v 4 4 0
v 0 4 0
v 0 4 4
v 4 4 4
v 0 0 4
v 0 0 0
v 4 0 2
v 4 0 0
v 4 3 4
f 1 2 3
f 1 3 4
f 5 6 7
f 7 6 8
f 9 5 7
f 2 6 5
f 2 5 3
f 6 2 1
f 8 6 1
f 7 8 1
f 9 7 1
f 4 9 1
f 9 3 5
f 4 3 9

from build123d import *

# Parameters (mm, degrees)
F0_W     = 4
F0_H     = 4
F1_DEPTH = 4
F5_DEPTH = 25


with BuildPart() as f1:
    # F0 (on Top) → F1 (new body)
    with BuildSketch(Plane.XY):
        with Locations((2, 2)):
            Rectangle(F0_W, F0_H)
    extrude(amount=F1_DEPTH)

    # F4 (on 3pt) → F5 (cut)
    with BuildSketch(Plane(origin=(1.1803278689, -1.5737704918, 2.3606557377), x_dir=(0.9232870715, 0.2130662473, -0.3195993709), z_dir=(0.3841106398, -0.5121475197, 0.7682212796))):
        Polygon((3.0539495442, 4.7149516679), (-1.2783974836, 2.2188007849), (3.0539495442, 1.1094003925), align=None)
    extrude(amount=F5_DEPTH, mode=Mode.SUBTRACT)


solid = f1.part
